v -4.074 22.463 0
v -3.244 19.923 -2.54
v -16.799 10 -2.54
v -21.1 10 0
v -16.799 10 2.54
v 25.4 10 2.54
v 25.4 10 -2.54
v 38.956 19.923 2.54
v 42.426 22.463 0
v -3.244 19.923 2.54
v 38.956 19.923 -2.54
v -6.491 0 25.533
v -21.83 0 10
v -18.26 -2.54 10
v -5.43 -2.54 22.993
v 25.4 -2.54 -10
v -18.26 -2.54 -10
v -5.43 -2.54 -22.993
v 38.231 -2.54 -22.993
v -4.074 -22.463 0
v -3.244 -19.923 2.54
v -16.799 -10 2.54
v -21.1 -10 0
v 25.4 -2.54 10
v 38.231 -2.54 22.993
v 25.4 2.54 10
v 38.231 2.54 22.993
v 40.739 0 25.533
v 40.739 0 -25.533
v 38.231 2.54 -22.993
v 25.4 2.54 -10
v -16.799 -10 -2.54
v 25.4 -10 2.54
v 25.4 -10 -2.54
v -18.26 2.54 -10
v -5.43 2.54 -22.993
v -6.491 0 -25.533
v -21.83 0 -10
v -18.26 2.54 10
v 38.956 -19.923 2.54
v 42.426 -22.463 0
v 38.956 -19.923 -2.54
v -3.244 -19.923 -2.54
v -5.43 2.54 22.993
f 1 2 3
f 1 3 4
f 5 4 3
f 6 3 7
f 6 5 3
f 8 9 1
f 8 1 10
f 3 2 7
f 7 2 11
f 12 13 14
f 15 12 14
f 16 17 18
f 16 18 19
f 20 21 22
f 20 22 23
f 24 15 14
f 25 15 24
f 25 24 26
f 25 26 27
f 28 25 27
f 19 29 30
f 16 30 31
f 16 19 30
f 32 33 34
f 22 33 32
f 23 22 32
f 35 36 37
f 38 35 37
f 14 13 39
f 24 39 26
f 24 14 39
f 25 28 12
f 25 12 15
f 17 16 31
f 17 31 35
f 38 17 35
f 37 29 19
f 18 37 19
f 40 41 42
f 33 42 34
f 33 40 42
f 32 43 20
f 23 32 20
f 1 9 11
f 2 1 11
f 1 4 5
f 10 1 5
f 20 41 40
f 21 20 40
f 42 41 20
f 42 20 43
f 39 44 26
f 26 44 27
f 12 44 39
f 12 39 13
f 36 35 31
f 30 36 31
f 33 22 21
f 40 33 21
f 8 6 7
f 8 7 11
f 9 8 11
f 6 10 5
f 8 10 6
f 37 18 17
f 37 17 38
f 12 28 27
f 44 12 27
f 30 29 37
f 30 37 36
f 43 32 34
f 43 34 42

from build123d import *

# Parameters (mm, degrees)
F2_DEPTH      = 2.54
F3_DEPTH      = 2.54
F4_T1_DEPTH   = 76.9282991577
F4_2_T1_DEPTH = 76.9282991577
F4_3_T1_DEPTH = 76.9282991577
F4_4_T1_DEPTH = 76.9282991577
F5_T1_DEPTH   = 44.3887766137
F5_2_T1_DEPTH = 42.9277887493
F5_3_T1_DEPTH = 44.3887766137
F5_4_T1_DEPTH = 42.9277887493


# Not quite as in the source:
# - a fillet or chamfer that OpenCascade refuses, or shapes differently, is made with other operations: its cross-section is extruded or revolved along the edge and cut away or added


with BuildPart() as f2:
    # F0 (on Top) → F2 (new body, symmetric)
    with BuildSketch(Plane.XY):
        Polygon((-25.4, 10), (25.4, 10), (45.8957331301, 25.0028305149), (-4.9042668699, 25.0028305149), align=None)
    extrude(amount=F2_DEPTH, both=True)

    # F4#3: chamfer of 5.08 on 2 edges, made by hand

    # F4_3_s2 → F4_3_t1 (cut)
    with BuildSketch(Plane.YZ.offset(-17.9684164487)):
        Polygon((25.0028305149, -2.54), (19.9228305149, 2.54), (25.0028305149, 2.54), align=None)
        Polygon((25.0028305149, 2.54), (19.9228305149, -2.54), (25.0028305149, -2.54), align=None)
    extrude(amount=F4_3_T1_DEPTH, mode=Mode.SUBTRACT)

    # F5#2: chamfer of 5.08 on 2 edges, made by hand

    # F5_2_s2 → F5_2_t1 (cut)
    with BuildSketch(Plane(origin=(12.3253045755, 9.0220952047, 0), x_dir=(0, 0, 1), z_dir=(-0.8069186272, -0.5906626187, 0))):
        Polygon((-2.54, 17.9920167866), (2.54, 23.0720167866), (-2.54, 23.0720167866), align=None)
        Polygon((-2.54, 23.0720167866), (2.54, 17.9920167866), (2.54, 23.0720167866), align=None)
    extrude(amount=F5_2_T1_DEPTH, mode=Mode.SUBTRACT)


with BuildPart() as f2b:
    # F0 (on Top) → F2, piece 2 (new body, symmetric)
    with BuildSketch(Plane.XY):
        Polygon((45.8957331301, -25.0028305149), (25.4, -10), (-25.4, -10), (-4.9042668699, -25.0028305149), align=None)
    extrude(amount=F2_DEPTH, both=True)

    # F4: chamfer of 5.08 on 2 edges, made by hand

    # F4_s2 → F4_t1 (cut)
    with BuildSketch(Plane.YZ.offset(-17.9684164487)):
        Polygon((-25.0028305149, 2.54), (-19.9228305149, -2.54), (-25.0028305149, -2.54), align=None)
        Polygon((-25.0028305149, -2.54), (-19.9228305149, 2.54), (-25.0028305149, 2.54), align=None)
    extrude(amount=F4_T1_DEPTH, mode=Mode.SUBTRACT)

    # F5#4: chamfer of 5.08 on 2 edges, made by hand

    # F5_4_s2 → F5_4_t1 (cut)
    with BuildSketch(Plane(origin=(-22.3139277895, 16.3337449128, 0), x_dir=(0, 0, 1), z_dir=(0.8069186272, -0.5906626187, 0))):
        Polygon((2.54, 17.9920167866), (-2.54, 23.0720167866), (2.54, 23.0720167866), align=None)
        Polygon((-2.54, 17.9920167866), (2.54, 23.0720167866), (-2.54, 23.0720167866), align=None)
    extrude(amount=F5_4_T1_DEPTH, mode=Mode.SUBTRACT)


with BuildPart() as f3:
    # F1 (on Front) → F3 (new body, symmetric)
    with BuildSketch(Plane.XZ):
        Polygon((-25.4, 10), (25.4, 10), (43.2473993288, 28.0729172299), (-7.5526006712, 28.0729172299), align=None)
    extrude(amount=F3_DEPTH, both=True)

    # F4#2: chamfer of 5.08 on 2 edges, made by hand

    # F4_2_s2 → F4_2_t1 (cut)
    with BuildSketch(Plane.YZ.offset(-20.6167502501)):
        Polygon((-2.54, 28.0729172299), (2.54, 22.9929172299), (2.54, 28.0729172299), align=None)
        Polygon((2.54, 28.0729172299), (-2.54, 22.9929172299), (-2.54, 28.0729172299), align=None)
    extrude(amount=F4_2_T1_DEPTH, mode=Mode.SUBTRACT)

    # F5#3: chamfer of 5.08 on 2 edges, made by hand

    # F5_3_s2 → F5_3_t1 (cut)
    with BuildSketch(Plane(origin=(14.4694272926, 0, 14.6522614868), x_dir=(0, 1, 0), z_dir=(-0.7026535169, 0, -0.7115321744))):
        Polygon((2.54, -20.0194523987), (-2.54, -25.0994523987), (2.54, -25.0994523987), align=None)
        Polygon((2.54, -25.0994523987), (-2.54, -20.0194523987), (-2.54, -25.0994523987), align=None)
    extrude(amount=F5_3_T1_DEPTH, mode=Mode.SUBTRACT)


with BuildPart() as f3b:
    # F1 (on Front) → F3, piece 2 (new body, symmetric)
    with BuildSketch(Plane.XZ):
        Polygon((43.2473993288, -28.0729172299), (25.4, -10), (-25.4, -10), (-7.5526006712, -28.0729172299), align=None)
    extrude(amount=F3_DEPTH, both=True)

    # F4#4: chamfer of 5.08 on 2 edges, made by hand

    # F4_4_s2 → F4_4_t1 (cut)
    with BuildSketch(Plane.YZ.offset(-20.6167502501)):
        Polygon((-2.54, -28.0729172299), (2.54, -22.9929172299), (2.54, -28.0729172299), align=None)
        Polygon((2.54, -28.0729172299), (-2.54, -22.9929172299), (-2.54, -28.0729172299), align=None)
    extrude(amount=F4_4_T1_DEPTH, mode=Mode.SUBTRACT)

    # F5: chamfer of 5.08 on 2 edges, made by hand

    # F5_s2 → F5_t1 (cut)
    with BuildSketch(Plane(origin=(-16.720502705, 0, 16.9317812564), x_dir=(0, 1, 0), z_dir=(0.7026535169, 0, -0.7115321744))):
        Polygon((2.54, -20.0194523987), (-2.54, -25.0994523987), (2.54, -25.0994523987), align=None)
        Polygon((-2.54, -20.0194523987), (2.54, -25.0994523987), (-2.54, -25.0994523987), align=None)
    extrude(amount=F5_T1_DEPTH, mode=Mode.SUBTRACT)


solid = Compound([f2.part, f2b.part, f3.part, f3b.part])
